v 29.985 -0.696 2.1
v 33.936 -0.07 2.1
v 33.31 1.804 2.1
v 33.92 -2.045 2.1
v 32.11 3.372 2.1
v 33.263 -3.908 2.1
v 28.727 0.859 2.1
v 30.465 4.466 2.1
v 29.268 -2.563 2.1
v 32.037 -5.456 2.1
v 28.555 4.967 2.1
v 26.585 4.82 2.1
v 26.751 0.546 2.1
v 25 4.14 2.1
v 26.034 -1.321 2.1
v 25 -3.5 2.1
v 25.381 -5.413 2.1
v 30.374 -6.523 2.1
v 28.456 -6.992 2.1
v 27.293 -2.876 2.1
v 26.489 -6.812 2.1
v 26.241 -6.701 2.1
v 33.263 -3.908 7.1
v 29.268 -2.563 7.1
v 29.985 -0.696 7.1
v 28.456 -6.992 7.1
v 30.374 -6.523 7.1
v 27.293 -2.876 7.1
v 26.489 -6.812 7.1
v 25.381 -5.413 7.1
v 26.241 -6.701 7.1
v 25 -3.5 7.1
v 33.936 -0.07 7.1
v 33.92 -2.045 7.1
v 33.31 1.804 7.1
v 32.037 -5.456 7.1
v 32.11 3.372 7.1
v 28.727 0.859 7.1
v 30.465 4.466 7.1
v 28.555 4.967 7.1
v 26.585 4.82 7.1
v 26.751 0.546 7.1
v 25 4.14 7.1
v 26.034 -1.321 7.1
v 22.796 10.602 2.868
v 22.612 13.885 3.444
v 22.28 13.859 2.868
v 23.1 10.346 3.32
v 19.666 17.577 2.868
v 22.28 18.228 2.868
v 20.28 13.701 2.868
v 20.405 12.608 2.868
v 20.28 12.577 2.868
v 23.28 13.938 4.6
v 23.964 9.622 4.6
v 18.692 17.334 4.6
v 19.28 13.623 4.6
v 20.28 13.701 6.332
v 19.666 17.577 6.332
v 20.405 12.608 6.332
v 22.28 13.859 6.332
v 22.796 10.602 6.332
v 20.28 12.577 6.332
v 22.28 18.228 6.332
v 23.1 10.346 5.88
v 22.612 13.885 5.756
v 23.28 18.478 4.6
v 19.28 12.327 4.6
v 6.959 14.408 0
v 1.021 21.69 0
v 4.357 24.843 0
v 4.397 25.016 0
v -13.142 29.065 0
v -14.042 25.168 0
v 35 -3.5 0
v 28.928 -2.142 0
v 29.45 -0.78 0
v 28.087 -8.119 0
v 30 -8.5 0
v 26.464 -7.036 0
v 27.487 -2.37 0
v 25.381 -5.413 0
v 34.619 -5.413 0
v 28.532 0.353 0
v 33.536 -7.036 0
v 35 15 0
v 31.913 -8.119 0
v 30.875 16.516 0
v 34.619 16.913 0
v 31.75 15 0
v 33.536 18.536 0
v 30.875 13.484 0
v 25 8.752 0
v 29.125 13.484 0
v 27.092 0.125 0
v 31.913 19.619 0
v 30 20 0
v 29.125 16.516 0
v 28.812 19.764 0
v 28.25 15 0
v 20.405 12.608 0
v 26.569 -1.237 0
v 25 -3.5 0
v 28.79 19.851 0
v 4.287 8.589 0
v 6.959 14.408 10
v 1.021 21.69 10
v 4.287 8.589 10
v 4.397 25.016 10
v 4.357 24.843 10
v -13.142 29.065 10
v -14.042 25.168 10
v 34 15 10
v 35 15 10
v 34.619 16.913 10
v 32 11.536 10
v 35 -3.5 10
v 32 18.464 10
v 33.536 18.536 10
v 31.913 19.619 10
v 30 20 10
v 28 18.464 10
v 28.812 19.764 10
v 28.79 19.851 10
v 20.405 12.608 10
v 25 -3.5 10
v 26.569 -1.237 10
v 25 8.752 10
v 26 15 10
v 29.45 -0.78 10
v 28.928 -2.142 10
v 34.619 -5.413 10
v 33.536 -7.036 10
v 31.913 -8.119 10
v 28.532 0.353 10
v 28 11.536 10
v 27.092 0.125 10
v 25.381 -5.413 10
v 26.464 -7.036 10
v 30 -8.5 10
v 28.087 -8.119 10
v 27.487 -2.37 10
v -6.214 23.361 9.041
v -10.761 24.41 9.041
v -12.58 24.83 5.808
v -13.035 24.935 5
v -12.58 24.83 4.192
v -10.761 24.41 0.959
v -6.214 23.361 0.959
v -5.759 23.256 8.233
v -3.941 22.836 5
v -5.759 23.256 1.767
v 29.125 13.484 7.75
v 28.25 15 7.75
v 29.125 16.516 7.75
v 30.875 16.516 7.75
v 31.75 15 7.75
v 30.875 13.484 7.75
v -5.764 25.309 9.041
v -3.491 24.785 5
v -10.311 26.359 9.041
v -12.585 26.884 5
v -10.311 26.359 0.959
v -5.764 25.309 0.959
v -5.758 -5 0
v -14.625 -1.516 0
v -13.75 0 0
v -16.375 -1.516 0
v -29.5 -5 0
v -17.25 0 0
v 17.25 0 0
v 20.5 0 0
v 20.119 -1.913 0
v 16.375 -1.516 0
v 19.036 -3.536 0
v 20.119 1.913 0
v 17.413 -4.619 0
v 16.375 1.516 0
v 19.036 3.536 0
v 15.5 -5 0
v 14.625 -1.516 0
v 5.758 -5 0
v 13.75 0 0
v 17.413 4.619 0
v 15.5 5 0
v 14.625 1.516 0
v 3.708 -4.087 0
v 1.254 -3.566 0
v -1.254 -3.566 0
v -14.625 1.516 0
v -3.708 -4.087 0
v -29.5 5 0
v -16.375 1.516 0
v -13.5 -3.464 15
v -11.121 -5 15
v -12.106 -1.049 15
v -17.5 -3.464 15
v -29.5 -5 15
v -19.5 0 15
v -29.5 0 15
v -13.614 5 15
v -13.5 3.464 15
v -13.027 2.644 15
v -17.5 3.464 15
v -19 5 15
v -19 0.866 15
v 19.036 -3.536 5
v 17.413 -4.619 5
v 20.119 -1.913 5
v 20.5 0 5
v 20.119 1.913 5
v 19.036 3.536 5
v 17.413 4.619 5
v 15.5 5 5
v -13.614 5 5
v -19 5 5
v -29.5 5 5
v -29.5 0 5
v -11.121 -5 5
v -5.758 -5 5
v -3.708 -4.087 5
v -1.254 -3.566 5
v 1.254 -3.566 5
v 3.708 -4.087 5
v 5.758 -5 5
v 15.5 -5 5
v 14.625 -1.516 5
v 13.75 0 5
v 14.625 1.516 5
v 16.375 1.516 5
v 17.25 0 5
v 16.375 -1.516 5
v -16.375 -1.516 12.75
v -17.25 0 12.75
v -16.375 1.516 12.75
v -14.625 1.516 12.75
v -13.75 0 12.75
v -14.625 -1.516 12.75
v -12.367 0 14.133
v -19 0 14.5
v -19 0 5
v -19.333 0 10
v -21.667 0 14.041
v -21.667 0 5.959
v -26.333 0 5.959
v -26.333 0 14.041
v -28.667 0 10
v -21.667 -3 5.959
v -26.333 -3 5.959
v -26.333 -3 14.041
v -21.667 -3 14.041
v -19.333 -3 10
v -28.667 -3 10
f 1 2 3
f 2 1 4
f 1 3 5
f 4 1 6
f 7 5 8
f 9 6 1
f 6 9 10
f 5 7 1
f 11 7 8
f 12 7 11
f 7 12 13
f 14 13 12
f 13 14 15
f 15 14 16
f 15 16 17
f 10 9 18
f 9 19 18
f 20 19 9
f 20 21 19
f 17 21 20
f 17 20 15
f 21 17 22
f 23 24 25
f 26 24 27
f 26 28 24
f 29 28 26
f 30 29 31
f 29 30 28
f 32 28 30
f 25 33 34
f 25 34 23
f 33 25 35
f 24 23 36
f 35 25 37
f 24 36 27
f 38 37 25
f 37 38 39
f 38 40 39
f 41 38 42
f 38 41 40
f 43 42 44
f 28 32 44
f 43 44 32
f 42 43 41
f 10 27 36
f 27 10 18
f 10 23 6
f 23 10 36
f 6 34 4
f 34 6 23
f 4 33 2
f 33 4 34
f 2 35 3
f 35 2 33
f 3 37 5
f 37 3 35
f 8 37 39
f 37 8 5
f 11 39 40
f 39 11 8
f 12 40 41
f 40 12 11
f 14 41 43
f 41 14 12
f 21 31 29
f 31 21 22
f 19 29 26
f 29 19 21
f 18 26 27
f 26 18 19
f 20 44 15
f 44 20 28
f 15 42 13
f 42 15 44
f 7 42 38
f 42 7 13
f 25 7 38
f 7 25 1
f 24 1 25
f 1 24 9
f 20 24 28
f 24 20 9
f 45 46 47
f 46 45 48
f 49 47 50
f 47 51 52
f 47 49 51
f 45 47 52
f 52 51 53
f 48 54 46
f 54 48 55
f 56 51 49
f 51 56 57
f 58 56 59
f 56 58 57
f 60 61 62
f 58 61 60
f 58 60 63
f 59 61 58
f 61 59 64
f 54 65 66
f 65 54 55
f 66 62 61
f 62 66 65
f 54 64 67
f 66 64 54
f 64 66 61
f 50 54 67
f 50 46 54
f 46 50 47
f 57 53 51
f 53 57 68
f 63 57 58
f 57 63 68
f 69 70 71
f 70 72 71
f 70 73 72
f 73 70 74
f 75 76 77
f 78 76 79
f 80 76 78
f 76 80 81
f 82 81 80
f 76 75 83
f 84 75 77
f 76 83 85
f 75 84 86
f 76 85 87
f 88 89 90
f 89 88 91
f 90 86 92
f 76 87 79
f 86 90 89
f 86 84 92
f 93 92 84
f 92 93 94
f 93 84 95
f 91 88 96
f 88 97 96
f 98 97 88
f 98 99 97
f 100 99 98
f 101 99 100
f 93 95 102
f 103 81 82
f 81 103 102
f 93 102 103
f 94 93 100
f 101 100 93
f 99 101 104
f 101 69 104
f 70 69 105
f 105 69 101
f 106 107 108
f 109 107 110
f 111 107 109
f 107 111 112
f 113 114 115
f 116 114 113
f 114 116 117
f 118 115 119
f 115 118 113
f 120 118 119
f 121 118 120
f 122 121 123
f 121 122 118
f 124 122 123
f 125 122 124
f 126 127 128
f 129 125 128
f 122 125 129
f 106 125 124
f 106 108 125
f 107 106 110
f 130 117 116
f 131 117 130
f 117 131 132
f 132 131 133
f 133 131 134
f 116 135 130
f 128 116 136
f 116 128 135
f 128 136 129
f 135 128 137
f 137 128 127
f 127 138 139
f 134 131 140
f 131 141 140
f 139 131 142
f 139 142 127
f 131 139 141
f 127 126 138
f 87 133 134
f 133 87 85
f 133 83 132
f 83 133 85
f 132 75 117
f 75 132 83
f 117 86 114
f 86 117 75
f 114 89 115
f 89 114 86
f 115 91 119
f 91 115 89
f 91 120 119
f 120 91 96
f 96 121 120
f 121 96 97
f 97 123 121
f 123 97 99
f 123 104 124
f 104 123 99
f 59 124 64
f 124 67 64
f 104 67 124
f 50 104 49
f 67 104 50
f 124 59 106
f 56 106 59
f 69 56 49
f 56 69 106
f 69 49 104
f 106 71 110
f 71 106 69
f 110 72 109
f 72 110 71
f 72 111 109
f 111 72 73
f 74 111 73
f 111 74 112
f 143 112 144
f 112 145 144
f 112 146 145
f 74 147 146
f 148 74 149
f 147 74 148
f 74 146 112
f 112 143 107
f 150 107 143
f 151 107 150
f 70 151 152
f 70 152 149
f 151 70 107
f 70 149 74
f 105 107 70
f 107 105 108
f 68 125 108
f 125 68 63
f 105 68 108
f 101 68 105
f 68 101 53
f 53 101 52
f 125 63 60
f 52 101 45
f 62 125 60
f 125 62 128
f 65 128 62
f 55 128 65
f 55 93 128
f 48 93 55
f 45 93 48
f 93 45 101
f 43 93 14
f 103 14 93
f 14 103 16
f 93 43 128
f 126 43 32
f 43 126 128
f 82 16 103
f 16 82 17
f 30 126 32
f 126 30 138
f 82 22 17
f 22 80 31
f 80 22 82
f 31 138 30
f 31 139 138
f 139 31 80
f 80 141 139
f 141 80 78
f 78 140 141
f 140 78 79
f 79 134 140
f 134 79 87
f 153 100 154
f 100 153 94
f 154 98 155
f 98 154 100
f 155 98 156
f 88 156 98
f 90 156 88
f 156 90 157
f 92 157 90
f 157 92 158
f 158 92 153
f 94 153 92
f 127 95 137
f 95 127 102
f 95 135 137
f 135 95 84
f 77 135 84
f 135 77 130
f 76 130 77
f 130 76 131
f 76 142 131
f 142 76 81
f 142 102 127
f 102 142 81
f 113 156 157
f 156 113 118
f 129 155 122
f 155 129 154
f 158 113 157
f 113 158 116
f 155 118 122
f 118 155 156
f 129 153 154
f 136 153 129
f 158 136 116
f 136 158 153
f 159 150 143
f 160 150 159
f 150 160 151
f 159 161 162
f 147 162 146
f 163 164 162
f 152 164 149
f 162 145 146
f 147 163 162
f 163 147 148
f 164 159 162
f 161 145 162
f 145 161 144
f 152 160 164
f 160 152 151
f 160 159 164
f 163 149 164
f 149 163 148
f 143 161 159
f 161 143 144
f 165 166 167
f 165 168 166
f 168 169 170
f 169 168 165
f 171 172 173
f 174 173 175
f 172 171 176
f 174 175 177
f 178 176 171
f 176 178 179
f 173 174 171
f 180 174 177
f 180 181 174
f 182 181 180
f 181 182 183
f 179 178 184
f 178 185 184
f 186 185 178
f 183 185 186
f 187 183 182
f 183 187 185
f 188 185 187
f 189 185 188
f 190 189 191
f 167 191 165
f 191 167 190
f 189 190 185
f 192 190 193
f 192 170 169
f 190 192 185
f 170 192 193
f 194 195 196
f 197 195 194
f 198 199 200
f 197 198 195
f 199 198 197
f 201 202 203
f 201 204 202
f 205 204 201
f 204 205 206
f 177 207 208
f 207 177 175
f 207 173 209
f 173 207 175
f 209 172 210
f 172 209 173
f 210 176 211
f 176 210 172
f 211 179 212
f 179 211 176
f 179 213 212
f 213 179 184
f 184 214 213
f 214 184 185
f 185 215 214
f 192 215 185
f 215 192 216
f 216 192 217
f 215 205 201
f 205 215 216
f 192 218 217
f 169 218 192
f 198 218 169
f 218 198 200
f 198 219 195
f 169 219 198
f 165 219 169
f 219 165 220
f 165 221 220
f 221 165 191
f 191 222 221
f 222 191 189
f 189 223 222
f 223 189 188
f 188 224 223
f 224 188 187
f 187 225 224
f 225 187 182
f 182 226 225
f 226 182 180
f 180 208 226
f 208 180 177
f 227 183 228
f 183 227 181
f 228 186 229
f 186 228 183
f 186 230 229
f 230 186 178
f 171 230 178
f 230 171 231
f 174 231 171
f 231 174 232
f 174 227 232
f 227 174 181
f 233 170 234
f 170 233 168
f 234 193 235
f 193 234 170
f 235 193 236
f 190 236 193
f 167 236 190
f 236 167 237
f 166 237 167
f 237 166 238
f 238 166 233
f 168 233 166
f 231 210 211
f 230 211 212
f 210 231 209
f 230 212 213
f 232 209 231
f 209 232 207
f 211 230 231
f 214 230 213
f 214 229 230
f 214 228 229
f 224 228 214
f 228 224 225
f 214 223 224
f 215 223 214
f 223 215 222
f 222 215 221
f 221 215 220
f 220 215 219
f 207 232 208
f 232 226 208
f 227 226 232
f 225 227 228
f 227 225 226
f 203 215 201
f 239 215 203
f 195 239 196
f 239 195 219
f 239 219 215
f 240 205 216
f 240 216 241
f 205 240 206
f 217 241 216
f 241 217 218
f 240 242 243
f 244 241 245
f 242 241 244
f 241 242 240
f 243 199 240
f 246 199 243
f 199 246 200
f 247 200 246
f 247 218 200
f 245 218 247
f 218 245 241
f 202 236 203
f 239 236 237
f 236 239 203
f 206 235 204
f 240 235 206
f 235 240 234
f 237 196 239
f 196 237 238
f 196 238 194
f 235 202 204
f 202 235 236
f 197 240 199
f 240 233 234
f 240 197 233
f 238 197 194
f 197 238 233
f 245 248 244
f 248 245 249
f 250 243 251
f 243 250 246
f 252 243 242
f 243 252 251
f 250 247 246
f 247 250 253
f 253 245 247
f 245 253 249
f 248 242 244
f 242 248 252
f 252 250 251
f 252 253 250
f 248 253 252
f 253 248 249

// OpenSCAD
filament_d = 1.75;
spring_d = 8;

plate();
//assembly();

module plate(){
translate([30,15,0]) idler();
base();
}

module assembly(){
union(){
translate([0, 15.5, 0]) base();
translate([15.5, 15.5, 0]) {
	%translate([-15.5, -15.5, 0]) translate([10.56 / 2 + 4 + filament_d, 0, 7.7]) linear_extrude(height = 4, convexity = 5) difference() {// 693 bearing
		circle(4);
		circle(1.5, $fn = 6);
	}

	translate([0, 0, 5]) rotate(-9) idler();
}
%translate([-15.5+9,20.5,0])cube([30,5,15]);
%translate([0, 0, 2]) difference() {// drive gear
	linear_extrude(height = 11, convexity = 5) difference() {
		circle(6.3);
		circle(2.5);
	}
	translate([0, 0, 7.7]) rotate_extrude(convexity = 5, $fs = 0.5) translate([5 + 2.5, 0, 0]) circle(r = 2);
}}}

module idler() difference() {
	linear_extrude(height = 10, convexity = 5) difference() {
		union() {
			circle(5);
			translate([0, -18.5, 0]) circle(5);
			rotate(180) translate([-5, 0, 0]) square([10, 18.5]);
			rotate(104){
				square([5, 25]);
				translate([0,22.5])square([15.8,4]);
			}
			rotate(77)translate([0,27.2])square([4,18]);
			rotate(50) translate([-8, -2, 0]) square([5, 10]);
		}
		circle(3 * 7/12, $fn = 6);
		rotate(9) translate([-15.5 + 10.56 / 2 + 4 + filament_d, -15.5, 0]) circle(2.5* 7/12, $fn = 6);
	}
	translate([0, 0, 4.6]) {
		rotate(9) translate([-15.5 + 10.56 / 2 + 4 + filament_d, -15.5, 0]) linear_extrude(height = 5, convexity = 5, center = true) difference() {
			circle(6);
			circle(2, $fn = 6);
		}
		translate([10.56 / 2 + 1.5, 0, 0]) rotate([-90, 0, 9]) translate([-15.5, 0, -15.5]) cylinder(r = 2, h = 50, $fn = 6);
		translate([10.56 / 2 + 1.5, 0, 0]) rotate([-90, 0, 0]) translate([-15.5, 0, -15.5]) rotate([0, 0, 0]) cylinder(r = 2, h = 100, center = true, $fn = 6);
	}
	translate([0, 0, 10 - 4]) cylinder(r1 = 0, r2 = 8, h = 8, $fn = 6);
	translate([0, 0, 10 / 2]) rotate([90, 0, -13]) translate([-24-15.5, 0, -2]) cylinder(r = spring_d * 7/12, h = 10, $fn = 6);
}

module base() difference() {
	linear_extrude(height = 15, convexity = 5) difference() {
		union() {
			translate([-7,0,0])square([45, 10], center = true);
			translate([15.5, 0, 0]) circle(5);
		}
		for (side = [1, -1]) translate([side * 15.5, 0, 0]) circle(3 * 7/12, $fn = 6);
		translate([0, -15.5, 0]) circle(12);
	}
	rotate([0,0,14])translate([-12, -10, 5]) linear_extrude(height = 15, convexity = 5)square(100);
	translate([-39,0,5])cube(20);
	translate([-15.5, 0, 15 - 4]) cylinder(r1 = 0, r2 = 8, h = 8, $fn = 6);
	translate([-24, 7, 10]) rotate([90,0,0])cylinder(r = spring_d * 7/12,h=10, $fn = 6);
}
